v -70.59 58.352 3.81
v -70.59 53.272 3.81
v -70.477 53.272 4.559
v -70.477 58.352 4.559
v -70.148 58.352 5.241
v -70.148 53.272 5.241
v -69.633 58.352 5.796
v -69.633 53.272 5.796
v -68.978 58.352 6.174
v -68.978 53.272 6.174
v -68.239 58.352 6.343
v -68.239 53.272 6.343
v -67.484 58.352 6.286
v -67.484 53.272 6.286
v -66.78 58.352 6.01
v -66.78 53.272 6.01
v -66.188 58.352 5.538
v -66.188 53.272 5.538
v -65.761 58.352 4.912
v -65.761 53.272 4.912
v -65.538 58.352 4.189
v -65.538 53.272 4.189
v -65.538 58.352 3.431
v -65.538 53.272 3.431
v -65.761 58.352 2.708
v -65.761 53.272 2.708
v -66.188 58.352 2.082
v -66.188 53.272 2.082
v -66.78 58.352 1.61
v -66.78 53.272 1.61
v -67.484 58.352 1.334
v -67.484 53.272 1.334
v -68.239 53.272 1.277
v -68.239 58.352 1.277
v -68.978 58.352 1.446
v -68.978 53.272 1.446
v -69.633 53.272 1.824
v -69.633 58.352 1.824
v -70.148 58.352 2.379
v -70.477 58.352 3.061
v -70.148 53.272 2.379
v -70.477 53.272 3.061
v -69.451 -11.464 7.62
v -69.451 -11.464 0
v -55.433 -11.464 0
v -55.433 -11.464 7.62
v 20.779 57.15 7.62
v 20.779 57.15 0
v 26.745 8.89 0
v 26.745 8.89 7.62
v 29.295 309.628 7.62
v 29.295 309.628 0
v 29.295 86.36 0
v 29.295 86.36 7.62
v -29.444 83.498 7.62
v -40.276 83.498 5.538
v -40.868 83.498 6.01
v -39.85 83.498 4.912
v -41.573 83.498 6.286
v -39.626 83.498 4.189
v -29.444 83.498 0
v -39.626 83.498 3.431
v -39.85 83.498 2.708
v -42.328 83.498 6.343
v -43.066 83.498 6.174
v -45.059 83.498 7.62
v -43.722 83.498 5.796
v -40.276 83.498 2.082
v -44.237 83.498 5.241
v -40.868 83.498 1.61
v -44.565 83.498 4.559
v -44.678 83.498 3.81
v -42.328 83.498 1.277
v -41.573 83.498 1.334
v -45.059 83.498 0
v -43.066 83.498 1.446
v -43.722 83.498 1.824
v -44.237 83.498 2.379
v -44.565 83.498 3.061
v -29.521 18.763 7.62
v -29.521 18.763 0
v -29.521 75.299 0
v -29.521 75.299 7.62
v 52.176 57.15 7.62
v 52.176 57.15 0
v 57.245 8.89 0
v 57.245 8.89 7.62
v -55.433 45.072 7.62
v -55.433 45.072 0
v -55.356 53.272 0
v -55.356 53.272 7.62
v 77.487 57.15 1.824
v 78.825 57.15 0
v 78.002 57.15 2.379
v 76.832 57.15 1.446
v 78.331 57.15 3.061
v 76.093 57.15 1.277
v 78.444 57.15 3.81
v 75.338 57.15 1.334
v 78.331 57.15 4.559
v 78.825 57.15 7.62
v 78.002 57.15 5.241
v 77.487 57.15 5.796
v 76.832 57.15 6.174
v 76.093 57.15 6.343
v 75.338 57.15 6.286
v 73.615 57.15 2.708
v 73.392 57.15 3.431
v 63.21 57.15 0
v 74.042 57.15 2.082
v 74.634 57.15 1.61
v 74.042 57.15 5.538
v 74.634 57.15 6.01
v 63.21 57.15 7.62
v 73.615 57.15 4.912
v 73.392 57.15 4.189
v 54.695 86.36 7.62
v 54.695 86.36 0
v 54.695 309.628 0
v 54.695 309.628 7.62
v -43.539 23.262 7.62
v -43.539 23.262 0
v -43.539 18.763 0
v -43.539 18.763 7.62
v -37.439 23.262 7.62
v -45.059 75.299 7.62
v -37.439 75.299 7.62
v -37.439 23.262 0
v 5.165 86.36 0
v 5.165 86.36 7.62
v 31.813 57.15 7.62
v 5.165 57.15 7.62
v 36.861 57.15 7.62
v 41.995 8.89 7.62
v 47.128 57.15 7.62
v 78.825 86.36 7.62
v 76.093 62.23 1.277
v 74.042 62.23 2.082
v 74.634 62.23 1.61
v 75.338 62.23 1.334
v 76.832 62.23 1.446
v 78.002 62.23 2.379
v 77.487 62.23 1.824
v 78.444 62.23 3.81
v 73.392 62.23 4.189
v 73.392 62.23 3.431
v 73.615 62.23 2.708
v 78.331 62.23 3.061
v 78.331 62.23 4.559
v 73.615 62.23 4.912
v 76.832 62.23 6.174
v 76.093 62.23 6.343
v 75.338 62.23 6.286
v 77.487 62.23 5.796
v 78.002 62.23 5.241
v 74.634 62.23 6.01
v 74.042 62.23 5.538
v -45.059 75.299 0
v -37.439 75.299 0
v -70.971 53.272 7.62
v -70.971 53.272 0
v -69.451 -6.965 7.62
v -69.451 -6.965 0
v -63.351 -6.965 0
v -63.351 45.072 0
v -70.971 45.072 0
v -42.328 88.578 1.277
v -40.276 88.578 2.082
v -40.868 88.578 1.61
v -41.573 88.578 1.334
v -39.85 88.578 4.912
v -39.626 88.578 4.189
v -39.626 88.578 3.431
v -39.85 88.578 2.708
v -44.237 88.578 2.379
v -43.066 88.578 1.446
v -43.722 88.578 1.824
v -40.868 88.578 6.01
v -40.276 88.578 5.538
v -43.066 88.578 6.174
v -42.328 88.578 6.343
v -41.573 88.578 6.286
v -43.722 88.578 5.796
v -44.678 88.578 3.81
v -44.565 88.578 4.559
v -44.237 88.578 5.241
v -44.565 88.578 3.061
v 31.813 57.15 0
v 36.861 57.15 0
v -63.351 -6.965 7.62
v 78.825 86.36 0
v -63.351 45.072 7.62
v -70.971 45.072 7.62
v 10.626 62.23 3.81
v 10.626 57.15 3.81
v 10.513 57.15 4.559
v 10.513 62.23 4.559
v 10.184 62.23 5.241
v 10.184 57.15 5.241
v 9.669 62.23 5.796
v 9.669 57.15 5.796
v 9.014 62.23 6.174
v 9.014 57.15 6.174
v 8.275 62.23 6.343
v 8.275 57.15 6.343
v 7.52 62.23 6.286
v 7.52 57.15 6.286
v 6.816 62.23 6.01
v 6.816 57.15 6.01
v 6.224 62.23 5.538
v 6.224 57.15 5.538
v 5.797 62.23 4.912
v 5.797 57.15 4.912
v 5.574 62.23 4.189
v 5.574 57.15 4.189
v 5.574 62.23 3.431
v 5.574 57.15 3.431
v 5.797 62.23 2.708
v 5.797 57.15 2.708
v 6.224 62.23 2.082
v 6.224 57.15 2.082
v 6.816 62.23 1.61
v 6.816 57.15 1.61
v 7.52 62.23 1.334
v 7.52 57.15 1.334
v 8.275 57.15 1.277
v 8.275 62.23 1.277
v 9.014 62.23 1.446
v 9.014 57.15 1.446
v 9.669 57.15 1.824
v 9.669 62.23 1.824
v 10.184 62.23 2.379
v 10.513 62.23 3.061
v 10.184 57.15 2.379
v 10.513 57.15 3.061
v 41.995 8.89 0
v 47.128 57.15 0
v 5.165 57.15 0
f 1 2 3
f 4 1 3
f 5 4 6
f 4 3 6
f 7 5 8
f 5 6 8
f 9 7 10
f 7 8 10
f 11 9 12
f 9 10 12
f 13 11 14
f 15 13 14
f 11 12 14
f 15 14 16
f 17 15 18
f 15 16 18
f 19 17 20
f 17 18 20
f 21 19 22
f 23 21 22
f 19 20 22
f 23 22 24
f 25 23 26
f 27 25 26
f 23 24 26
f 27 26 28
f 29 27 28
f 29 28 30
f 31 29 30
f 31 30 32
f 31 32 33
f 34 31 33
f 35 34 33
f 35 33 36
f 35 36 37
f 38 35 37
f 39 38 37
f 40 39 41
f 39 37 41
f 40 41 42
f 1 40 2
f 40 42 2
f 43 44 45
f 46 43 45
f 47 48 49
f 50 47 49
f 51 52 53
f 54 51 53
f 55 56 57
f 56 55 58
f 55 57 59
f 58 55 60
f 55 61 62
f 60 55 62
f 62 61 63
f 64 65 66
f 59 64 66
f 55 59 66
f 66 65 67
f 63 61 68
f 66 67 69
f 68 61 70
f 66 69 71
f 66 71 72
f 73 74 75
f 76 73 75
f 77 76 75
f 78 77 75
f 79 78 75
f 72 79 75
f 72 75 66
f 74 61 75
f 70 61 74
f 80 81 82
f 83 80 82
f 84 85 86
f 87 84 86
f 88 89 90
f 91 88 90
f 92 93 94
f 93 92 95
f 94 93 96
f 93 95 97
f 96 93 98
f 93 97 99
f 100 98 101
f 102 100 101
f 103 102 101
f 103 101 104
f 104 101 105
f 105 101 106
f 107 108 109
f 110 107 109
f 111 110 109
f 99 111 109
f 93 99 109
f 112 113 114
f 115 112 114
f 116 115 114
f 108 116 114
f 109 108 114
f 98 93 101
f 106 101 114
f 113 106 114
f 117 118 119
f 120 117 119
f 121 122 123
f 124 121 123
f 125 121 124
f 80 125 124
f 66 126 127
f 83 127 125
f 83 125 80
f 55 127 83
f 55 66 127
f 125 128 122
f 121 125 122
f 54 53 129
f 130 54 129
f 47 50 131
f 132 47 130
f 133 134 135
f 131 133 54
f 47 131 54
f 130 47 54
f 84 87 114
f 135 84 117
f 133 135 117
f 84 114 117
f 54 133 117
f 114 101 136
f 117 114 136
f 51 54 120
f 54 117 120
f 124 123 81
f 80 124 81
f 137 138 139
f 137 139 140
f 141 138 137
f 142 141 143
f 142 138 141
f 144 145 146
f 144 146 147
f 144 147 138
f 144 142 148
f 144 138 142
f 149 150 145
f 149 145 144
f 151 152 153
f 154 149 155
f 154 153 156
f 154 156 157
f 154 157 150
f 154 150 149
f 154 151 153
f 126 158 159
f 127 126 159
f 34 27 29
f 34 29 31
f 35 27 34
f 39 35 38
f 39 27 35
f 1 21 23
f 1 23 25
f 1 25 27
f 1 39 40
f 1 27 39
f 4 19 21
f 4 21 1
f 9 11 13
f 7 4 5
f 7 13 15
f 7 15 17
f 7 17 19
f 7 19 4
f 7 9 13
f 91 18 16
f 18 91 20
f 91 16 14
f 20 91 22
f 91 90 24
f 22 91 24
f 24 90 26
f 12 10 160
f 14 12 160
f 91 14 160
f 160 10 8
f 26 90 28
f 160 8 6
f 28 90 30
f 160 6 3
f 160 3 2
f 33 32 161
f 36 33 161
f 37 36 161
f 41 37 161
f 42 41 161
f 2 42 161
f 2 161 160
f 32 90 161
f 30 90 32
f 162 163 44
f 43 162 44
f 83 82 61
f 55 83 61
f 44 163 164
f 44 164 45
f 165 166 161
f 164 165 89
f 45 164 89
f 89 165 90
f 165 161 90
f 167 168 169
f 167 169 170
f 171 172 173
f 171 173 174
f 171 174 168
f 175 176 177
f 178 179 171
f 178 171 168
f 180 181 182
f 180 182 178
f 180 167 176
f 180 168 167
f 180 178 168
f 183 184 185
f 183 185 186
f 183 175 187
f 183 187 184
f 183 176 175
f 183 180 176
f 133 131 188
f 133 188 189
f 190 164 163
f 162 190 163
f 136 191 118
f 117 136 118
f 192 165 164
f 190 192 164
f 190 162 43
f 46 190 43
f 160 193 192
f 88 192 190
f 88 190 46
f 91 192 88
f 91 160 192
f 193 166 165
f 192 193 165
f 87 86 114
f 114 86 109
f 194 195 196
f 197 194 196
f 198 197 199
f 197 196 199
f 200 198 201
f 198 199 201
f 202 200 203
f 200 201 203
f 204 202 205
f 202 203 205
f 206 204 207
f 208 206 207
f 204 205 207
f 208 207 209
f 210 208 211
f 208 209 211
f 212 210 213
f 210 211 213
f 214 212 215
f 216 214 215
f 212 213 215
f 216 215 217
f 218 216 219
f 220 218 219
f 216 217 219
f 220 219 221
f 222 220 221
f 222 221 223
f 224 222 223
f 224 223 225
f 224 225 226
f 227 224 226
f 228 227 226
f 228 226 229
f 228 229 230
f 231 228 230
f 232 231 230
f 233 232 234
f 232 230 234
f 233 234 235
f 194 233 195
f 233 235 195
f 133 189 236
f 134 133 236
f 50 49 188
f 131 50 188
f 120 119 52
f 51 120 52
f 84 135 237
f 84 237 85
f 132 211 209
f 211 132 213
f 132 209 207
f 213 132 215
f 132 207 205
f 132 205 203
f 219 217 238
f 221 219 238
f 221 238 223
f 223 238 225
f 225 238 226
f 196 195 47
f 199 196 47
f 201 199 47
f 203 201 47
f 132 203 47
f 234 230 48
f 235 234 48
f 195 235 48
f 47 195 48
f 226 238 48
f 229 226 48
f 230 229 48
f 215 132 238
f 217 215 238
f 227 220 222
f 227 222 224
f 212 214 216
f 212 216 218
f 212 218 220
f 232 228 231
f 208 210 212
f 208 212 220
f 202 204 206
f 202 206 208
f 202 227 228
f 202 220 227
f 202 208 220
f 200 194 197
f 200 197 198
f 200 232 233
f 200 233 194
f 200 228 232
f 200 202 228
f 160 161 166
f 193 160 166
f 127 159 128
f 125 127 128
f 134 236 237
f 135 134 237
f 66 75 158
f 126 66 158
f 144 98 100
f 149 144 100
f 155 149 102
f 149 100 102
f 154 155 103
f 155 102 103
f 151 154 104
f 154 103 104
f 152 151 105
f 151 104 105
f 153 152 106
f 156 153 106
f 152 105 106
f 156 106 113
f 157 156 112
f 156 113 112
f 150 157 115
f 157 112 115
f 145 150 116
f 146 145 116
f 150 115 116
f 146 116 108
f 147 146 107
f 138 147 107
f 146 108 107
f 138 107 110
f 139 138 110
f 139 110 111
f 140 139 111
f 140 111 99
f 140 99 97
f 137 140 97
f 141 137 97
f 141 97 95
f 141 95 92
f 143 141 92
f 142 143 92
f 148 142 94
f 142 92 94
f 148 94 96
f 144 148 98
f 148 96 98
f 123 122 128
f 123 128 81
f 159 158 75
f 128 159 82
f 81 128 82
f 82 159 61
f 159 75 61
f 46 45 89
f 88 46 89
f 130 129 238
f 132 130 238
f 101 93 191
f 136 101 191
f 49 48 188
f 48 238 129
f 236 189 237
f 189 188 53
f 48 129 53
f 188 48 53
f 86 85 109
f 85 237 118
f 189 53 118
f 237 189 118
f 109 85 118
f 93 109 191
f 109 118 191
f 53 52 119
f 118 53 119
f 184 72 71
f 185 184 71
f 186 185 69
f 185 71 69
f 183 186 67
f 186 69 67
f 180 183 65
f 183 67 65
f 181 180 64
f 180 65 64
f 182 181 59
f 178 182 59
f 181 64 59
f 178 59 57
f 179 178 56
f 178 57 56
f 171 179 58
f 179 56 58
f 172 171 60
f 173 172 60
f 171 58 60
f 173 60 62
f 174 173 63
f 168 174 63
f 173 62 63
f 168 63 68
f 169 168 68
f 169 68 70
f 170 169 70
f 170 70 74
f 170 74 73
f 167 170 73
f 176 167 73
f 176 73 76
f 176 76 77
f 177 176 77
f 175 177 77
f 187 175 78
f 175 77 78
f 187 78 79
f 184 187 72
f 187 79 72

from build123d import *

# Parameters (mm, degrees)
F1_DEPTH  = 101.6
F2_W      = 223.268278
F2_H      = 93.98
F2_W_2    = 84.40165
F3_DEPTH  = 49.531
F4_W      = 84.40165
F4_H      = 93.98
F5_DEPTH  = 73.661
F7_DEPTH  = 7.621
F9_DEPTH  = 7.62
F10_R     = 2.54
F11_DEPTH = 5.08
F12_R     = 2.54
F13_DEPTH = 5.08
F14_R     = 2.54
F15_DEPTH = 5.08


with BuildPart() as f1:
    # F0 (on Top) → F1 (new body)
    with BuildSketch(Plane.XY):
        Polygon((20.779335, 57.15), (26.7446, 8.89), (31.812784, 57.15), (36.860802, 57.15), (41.994592, 8.89), (47.128382, 57.15), (52.1764, 57.15), (57.244584, 8.89), (63.209849, 57.15), (71.094898, 57.15), (71.094898, 6.35), (65.14, 6.35), (65.14, 1.95835), (78.824592, 1.95835), (78.824592, 57.15), (78.824592, 63.5), (78.824592, 86.36), (54.694592, 86.36), (54.694592, 309.628278), (29.294592, 309.628278), (29.294592, 86.36), (5.164592, 86.36), (5.164592, 63.5), (5.164592, 57.15), (5.164592, 1.95835), (18.849184, 1.95835), (18.849184, 6.35), (12.894286, 6.35), (12.894286, 57.15), align=None)
    extrude(amount=F1_DEPTH)

    # F2 (on face) → F3 (cut, through all)
    with BuildSketch(Plane.YZ.offset(54.694592)):
        with Locations((197.994139, 54.61)):
            Rectangle(F2_W, F2_H)
        with Locations((44.159175, 54.61)):
            Rectangle(F2_W_2, F2_H)
    extrude(amount=-F3_DEPTH, mode=Mode.SUBTRACT)

    # F4 (on face) → F5 (cut, through all)
    with BuildSketch(Plane.YZ.offset(78.824592)):
        with Locations((44.159175, 54.61)):
            Rectangle(F4_W, F4_H)
    extrude(amount=-F5_DEPTH, mode=Mode.SUBTRACT)

    # F6 (on face) → F7 (cut, through all)
    with BuildSketch(Plane.XY.offset(7.62)):
        Polygon((5.164592, 57.15), (5.164592, 1.95835), (18.849184, 1.95835), (18.849184, 6.35), (12.894286, 6.35), (12.894286, 57.15), align=None)
        Polygon((78.824592, 1.95835), (78.824592, 57.15), (71.094898, 57.15), (71.094898, 6.35), (65.14, 6.35), (65.14, 1.95835), align=None)
    extrude(amount=-F7_DEPTH, mode=Mode.SUBTRACT)

    # F14 (on face) → F15 (cut)
    with BuildSketch(Plane.XZ.offset(-57.15)):
        with Locations((8.085592, 3.81)):
            Circle(F14_R)
        with Locations((75.903592, 3.81)):
            Circle(F14_R)
    extrude(amount=-F15_DEPTH, mode=Mode.SUBTRACT)


with BuildPart() as f9:
    # F8 (on Top) → F9 (new body)
    with BuildSketch(Plane.XY):
        Polygon((-63.350664, -6.965021), (-69.450617, -6.965021), (-69.450617, -11.463647), (-55.432681, -11.463647), (-55.432681, 45.07242), (-55.35614, 53.271673), (-70.970664, 53.271673), (-70.970664, 45.07242), (-63.350664, 45.07242), align=None)
        Polygon((-37.438962, 23.261642), (-43.538916, 23.261642), (-43.538916, 18.763015), (-29.52098, 18.763015), (-29.52098, 75.299082), (-29.444438, 83.498336), (-45.058962, 83.498336), (-45.058962, 75.299082), (-37.438962, 75.299082), align=None)
    extrude(amount=F9_DEPTH)

    # F10 (on face) → F11 (join)
    with BuildSketch(Plane(origin=(0, 53.271673, 0), x_dir=(-1, 0, 0), z_dir=(0, 1, 0))):
        with Locations((68.049664, 3.81)):
            Circle(F10_R)
    extrude(amount=F11_DEPTH)

    # F12 (on face) → F13 (join)
    with BuildSketch(Plane(origin=(0, 83.498336, 0), x_dir=(-1, 0, 0), z_dir=(0, 1, 0))):
        with Locations((42.137962, 3.81)):
            Circle(F12_R)
    extrude(amount=F13_DEPTH)


solid = Compound([f1.part, f9.part])
